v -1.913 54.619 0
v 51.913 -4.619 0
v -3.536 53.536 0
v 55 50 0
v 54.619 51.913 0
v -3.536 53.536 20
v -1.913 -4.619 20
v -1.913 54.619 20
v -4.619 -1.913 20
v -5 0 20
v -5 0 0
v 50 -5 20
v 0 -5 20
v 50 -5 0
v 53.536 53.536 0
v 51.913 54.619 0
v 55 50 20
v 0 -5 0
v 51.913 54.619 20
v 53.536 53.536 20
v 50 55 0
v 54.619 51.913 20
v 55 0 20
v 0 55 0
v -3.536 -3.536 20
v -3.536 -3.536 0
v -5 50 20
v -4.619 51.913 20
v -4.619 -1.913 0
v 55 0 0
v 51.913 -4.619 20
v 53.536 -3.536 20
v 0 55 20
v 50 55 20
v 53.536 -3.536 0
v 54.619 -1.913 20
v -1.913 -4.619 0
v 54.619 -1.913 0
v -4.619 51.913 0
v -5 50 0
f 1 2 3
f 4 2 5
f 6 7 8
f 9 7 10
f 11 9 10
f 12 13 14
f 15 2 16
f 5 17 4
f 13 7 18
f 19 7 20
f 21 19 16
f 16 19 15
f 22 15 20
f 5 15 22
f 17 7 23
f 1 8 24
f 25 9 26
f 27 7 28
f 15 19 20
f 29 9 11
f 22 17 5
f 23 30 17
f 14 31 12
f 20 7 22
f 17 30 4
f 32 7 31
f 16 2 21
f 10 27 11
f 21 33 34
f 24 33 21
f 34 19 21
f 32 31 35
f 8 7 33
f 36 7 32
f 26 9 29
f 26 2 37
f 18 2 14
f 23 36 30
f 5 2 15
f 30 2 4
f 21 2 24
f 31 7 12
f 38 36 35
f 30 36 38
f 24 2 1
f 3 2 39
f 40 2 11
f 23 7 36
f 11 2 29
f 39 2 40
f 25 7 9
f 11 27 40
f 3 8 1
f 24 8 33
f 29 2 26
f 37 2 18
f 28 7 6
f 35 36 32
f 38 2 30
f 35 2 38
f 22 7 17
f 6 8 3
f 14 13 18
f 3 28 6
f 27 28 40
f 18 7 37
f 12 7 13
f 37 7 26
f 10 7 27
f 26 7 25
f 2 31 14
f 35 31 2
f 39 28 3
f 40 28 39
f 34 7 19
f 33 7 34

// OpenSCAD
minkowski() {
    cube([50, 50, 10]);
    cylinder(r = 5, h = 10);
}
